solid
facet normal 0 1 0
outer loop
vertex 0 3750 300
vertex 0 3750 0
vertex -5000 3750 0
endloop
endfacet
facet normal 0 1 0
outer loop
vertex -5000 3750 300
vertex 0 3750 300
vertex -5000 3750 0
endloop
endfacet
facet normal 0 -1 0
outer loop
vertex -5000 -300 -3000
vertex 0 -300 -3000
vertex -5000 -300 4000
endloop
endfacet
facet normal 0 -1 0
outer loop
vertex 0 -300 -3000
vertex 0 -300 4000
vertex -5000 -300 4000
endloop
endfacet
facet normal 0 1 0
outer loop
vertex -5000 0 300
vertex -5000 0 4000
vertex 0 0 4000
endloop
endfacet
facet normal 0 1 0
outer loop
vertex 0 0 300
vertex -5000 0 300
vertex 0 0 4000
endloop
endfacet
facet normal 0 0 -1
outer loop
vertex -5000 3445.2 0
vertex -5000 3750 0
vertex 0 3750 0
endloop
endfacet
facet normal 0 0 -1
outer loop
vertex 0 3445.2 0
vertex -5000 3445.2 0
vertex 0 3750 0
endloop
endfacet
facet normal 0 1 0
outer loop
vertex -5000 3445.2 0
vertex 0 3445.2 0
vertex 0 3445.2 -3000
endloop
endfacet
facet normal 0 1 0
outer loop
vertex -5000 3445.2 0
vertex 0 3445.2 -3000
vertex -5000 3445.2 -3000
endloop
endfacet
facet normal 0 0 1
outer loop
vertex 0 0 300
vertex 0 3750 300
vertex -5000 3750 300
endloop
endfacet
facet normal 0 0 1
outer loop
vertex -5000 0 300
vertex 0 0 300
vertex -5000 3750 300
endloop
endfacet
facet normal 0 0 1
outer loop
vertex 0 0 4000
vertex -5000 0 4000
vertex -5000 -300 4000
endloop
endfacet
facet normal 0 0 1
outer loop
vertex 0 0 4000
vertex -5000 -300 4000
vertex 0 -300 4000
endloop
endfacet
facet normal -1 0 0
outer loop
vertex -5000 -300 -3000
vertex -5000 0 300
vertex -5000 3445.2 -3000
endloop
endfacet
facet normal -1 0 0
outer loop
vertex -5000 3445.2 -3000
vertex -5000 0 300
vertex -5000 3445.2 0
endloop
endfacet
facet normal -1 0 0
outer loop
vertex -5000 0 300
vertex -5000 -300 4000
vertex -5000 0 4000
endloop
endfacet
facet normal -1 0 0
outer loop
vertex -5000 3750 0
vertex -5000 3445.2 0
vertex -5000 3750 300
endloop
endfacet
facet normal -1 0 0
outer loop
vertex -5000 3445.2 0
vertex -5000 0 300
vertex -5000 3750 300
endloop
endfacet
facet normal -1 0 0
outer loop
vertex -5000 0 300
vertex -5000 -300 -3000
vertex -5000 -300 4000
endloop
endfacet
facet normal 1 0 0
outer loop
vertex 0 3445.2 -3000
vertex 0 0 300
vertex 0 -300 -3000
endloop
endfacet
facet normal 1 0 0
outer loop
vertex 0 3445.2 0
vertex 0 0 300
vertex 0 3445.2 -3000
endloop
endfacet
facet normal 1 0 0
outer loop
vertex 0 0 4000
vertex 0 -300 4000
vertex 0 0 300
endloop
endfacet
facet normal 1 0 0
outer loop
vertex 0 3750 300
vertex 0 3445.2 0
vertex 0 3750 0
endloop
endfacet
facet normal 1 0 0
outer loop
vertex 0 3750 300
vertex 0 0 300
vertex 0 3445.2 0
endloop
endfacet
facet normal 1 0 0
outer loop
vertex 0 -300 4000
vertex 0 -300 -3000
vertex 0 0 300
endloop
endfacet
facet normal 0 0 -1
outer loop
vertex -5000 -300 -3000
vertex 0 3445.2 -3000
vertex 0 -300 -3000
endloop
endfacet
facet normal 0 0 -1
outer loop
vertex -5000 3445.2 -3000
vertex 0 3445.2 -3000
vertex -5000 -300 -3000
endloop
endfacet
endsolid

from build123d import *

# Parameters (mm, degrees)
CROQUIS1_W              = 5000
CROQUIS1_H              = 3750
SALIENTE_EXTRUIR1_DEPTH = 300
CROQUIS2_W              = 5000
CROQUIS2_H              = 4000
SALIENTE_EXTRUIR2_DEPTH = 300
CROQUIS3_W              = 5000
CROQUIS3_H              = 3745.2
SALIENTE_EXTRUIR3_DEPTH = 3000


with BuildPart() as part:
    # Croquis1 → Saliente-Extruir1 (new body)
    with BuildSketch(Plane(origin=(0, 0, 0), x_dir=(-1, 0, 0), z_dir=(0, 0, -1))):
        with Locations((2500, 1875)):
            Rectangle(CROQUIS1_W, CROQUIS1_H)
    extrude(amount=-SALIENTE_EXTRUIR1_DEPTH)

    # Croquis2 → Saliente-Extruir2 (add)
    with BuildSketch(Plane.XZ):
        with Locations((-2500, 2000)):
            Rectangle(CROQUIS2_W, CROQUIS2_H)
    extrude(amount=SALIENTE_EXTRUIR2_DEPTH)

    # Croquis3 → Saliente-Extruir3 (add)
    with BuildSketch(Plane(origin=(0, 0, 0), x_dir=(-1, 0, 0), z_dir=(0, 0, -1))):
        with Locations((2500, 1572.6)):
            Rectangle(CROQUIS3_W, CROQUIS3_H)
    extrude(amount=SALIENTE_EXTRUIR3_DEPTH)


solid = part.part
